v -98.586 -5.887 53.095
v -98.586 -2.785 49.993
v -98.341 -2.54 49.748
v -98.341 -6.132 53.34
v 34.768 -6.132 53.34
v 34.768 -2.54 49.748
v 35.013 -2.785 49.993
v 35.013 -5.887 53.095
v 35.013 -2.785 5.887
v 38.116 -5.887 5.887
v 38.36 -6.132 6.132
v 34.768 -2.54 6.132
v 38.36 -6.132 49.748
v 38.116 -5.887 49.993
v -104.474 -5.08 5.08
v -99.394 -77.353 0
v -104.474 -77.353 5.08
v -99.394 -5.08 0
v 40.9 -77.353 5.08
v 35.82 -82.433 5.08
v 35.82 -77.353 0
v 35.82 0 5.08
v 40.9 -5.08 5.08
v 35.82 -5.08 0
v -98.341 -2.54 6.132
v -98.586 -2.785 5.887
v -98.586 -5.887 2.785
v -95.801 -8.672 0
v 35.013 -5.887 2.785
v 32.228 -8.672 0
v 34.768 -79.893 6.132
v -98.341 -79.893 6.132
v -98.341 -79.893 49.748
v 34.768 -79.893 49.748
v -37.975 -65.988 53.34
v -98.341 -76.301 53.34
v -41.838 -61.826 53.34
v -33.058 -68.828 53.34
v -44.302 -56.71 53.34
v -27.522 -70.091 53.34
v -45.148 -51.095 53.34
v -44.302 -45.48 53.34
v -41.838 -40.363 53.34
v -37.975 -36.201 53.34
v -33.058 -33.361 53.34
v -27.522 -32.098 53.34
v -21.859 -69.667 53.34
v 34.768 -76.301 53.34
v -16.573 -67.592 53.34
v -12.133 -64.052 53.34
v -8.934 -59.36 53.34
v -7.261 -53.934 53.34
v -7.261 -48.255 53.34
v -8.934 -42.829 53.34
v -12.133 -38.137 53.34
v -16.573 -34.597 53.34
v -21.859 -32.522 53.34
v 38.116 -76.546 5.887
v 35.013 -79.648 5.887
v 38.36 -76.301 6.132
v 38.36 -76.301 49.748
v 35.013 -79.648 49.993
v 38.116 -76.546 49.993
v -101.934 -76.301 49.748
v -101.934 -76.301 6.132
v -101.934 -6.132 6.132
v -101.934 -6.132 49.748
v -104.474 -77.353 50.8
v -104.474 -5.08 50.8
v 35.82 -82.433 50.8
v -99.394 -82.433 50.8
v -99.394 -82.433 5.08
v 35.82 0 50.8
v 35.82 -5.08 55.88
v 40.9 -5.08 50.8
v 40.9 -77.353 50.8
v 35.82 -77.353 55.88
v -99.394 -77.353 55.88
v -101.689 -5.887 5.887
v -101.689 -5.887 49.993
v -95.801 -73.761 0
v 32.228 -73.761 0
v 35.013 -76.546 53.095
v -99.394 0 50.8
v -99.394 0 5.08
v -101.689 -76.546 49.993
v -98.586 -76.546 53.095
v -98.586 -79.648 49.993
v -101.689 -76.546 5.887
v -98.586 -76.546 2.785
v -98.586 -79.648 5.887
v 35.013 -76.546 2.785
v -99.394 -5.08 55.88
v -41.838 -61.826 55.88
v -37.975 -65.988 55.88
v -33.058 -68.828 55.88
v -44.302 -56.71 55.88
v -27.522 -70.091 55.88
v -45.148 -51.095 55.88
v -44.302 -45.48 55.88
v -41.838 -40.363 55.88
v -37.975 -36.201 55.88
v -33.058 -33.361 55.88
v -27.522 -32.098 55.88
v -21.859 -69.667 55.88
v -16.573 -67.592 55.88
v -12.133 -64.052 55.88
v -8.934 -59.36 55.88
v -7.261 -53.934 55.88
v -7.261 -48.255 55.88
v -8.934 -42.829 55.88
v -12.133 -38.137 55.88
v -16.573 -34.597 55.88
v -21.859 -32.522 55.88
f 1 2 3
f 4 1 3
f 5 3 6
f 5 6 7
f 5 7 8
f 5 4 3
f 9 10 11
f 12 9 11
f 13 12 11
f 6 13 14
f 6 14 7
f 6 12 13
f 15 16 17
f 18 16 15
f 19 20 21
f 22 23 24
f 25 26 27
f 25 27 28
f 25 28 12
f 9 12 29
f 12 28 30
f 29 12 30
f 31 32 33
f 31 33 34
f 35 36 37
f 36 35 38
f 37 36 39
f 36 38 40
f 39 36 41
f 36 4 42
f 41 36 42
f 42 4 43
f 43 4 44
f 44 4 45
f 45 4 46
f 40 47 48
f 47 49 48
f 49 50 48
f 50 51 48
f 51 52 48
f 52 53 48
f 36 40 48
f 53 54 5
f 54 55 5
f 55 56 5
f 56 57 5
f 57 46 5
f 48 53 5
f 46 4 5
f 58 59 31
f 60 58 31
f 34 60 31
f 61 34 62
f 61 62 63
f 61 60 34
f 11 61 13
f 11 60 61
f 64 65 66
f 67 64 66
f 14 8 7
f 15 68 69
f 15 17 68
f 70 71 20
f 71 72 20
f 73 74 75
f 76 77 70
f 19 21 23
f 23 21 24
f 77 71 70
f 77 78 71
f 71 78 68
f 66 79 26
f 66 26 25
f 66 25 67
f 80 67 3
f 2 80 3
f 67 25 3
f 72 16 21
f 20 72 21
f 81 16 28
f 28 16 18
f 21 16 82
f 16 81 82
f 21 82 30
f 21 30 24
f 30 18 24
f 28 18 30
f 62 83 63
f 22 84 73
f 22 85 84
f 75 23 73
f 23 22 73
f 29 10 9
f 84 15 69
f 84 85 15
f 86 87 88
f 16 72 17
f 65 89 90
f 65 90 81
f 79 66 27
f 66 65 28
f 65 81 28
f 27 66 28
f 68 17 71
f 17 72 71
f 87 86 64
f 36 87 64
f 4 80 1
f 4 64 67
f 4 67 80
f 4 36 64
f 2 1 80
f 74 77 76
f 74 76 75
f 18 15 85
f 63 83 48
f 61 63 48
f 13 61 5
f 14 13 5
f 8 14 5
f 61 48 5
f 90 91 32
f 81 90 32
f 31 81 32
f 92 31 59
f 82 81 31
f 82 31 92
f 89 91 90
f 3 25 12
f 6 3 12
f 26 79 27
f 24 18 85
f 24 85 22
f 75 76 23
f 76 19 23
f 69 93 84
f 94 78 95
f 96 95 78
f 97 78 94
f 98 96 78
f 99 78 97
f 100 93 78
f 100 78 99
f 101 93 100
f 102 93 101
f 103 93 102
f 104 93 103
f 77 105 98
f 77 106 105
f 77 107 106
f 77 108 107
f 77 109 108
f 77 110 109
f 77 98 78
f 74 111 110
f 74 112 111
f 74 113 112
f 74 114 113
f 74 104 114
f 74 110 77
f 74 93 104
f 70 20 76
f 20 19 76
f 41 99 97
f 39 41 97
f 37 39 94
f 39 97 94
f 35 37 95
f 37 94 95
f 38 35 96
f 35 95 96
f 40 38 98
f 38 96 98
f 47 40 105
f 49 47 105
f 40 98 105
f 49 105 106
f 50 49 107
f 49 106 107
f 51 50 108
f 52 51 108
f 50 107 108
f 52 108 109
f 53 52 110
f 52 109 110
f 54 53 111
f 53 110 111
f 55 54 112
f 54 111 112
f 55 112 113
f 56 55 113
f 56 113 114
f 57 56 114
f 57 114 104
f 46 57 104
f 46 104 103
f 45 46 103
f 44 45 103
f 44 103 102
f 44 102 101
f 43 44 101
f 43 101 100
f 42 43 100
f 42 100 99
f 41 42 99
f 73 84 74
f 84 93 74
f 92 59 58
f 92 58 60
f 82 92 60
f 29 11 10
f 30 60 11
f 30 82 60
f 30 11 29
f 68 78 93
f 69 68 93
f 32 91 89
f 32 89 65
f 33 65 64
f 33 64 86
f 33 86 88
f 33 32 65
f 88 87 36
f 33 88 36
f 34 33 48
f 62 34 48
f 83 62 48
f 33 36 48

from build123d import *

# Parameters (mm, degrees)
F0_W     = 145.373996
F0_H     = 82.43306
F1_DEPTH = 55.88
F2_SIZE  = 5.08
F3_T     = -2.54
F5_D     = 38.1


with BuildPart() as f1:
    # F0 (on Top) → F1 (new body)
    with BuildSketch(Plane.XY):
        with Locations((-31.786533, -41.21653)):
            Rectangle(F0_W, F0_H)
    extrude(amount=F1_DEPTH)

    # F2
    f2_edges = [f1.edges().sort_by_distance(p)[0] for p in [
        (-31.786533, -82.43306, 55.88),
        (40.900465, -41.21653, 55.88),
        (-31.786533, 0, 55.88),
        (-104.473531, -41.21653, 55.88),
        (-104.473531, -82.43306, 27.94),
        (40.900465, -82.43306, 27.94),
        (-31.786533, -82.43306, 0),
        (40.900465, 0, 27.94),
        (40.900465, -41.21653, 0),
        (-104.473531, 0, 27.94),
        (-104.473531, -41.21653, 0),
        (-31.786533, 0, 0),
    ]]
    chamfer(f2_edges, length=F2_SIZE)

    # F3
    f3_openings = [f1.faces().sort_by_distance(p)[0] for p in [
        (-31.786533, -41.21653, 0),
    ]]
    offset(amount=F3_T, openings=f3_openings)

    # F5 (through all)
    with Locations(Plane(origin=(0, 0, 53.34), x_dir=(1, 0, 0), z_dir=(0, 0, -1))):
        with Locations((-26.097942, 51.094607)):
            Hole(F5_D / 2)


solid = f1.part
